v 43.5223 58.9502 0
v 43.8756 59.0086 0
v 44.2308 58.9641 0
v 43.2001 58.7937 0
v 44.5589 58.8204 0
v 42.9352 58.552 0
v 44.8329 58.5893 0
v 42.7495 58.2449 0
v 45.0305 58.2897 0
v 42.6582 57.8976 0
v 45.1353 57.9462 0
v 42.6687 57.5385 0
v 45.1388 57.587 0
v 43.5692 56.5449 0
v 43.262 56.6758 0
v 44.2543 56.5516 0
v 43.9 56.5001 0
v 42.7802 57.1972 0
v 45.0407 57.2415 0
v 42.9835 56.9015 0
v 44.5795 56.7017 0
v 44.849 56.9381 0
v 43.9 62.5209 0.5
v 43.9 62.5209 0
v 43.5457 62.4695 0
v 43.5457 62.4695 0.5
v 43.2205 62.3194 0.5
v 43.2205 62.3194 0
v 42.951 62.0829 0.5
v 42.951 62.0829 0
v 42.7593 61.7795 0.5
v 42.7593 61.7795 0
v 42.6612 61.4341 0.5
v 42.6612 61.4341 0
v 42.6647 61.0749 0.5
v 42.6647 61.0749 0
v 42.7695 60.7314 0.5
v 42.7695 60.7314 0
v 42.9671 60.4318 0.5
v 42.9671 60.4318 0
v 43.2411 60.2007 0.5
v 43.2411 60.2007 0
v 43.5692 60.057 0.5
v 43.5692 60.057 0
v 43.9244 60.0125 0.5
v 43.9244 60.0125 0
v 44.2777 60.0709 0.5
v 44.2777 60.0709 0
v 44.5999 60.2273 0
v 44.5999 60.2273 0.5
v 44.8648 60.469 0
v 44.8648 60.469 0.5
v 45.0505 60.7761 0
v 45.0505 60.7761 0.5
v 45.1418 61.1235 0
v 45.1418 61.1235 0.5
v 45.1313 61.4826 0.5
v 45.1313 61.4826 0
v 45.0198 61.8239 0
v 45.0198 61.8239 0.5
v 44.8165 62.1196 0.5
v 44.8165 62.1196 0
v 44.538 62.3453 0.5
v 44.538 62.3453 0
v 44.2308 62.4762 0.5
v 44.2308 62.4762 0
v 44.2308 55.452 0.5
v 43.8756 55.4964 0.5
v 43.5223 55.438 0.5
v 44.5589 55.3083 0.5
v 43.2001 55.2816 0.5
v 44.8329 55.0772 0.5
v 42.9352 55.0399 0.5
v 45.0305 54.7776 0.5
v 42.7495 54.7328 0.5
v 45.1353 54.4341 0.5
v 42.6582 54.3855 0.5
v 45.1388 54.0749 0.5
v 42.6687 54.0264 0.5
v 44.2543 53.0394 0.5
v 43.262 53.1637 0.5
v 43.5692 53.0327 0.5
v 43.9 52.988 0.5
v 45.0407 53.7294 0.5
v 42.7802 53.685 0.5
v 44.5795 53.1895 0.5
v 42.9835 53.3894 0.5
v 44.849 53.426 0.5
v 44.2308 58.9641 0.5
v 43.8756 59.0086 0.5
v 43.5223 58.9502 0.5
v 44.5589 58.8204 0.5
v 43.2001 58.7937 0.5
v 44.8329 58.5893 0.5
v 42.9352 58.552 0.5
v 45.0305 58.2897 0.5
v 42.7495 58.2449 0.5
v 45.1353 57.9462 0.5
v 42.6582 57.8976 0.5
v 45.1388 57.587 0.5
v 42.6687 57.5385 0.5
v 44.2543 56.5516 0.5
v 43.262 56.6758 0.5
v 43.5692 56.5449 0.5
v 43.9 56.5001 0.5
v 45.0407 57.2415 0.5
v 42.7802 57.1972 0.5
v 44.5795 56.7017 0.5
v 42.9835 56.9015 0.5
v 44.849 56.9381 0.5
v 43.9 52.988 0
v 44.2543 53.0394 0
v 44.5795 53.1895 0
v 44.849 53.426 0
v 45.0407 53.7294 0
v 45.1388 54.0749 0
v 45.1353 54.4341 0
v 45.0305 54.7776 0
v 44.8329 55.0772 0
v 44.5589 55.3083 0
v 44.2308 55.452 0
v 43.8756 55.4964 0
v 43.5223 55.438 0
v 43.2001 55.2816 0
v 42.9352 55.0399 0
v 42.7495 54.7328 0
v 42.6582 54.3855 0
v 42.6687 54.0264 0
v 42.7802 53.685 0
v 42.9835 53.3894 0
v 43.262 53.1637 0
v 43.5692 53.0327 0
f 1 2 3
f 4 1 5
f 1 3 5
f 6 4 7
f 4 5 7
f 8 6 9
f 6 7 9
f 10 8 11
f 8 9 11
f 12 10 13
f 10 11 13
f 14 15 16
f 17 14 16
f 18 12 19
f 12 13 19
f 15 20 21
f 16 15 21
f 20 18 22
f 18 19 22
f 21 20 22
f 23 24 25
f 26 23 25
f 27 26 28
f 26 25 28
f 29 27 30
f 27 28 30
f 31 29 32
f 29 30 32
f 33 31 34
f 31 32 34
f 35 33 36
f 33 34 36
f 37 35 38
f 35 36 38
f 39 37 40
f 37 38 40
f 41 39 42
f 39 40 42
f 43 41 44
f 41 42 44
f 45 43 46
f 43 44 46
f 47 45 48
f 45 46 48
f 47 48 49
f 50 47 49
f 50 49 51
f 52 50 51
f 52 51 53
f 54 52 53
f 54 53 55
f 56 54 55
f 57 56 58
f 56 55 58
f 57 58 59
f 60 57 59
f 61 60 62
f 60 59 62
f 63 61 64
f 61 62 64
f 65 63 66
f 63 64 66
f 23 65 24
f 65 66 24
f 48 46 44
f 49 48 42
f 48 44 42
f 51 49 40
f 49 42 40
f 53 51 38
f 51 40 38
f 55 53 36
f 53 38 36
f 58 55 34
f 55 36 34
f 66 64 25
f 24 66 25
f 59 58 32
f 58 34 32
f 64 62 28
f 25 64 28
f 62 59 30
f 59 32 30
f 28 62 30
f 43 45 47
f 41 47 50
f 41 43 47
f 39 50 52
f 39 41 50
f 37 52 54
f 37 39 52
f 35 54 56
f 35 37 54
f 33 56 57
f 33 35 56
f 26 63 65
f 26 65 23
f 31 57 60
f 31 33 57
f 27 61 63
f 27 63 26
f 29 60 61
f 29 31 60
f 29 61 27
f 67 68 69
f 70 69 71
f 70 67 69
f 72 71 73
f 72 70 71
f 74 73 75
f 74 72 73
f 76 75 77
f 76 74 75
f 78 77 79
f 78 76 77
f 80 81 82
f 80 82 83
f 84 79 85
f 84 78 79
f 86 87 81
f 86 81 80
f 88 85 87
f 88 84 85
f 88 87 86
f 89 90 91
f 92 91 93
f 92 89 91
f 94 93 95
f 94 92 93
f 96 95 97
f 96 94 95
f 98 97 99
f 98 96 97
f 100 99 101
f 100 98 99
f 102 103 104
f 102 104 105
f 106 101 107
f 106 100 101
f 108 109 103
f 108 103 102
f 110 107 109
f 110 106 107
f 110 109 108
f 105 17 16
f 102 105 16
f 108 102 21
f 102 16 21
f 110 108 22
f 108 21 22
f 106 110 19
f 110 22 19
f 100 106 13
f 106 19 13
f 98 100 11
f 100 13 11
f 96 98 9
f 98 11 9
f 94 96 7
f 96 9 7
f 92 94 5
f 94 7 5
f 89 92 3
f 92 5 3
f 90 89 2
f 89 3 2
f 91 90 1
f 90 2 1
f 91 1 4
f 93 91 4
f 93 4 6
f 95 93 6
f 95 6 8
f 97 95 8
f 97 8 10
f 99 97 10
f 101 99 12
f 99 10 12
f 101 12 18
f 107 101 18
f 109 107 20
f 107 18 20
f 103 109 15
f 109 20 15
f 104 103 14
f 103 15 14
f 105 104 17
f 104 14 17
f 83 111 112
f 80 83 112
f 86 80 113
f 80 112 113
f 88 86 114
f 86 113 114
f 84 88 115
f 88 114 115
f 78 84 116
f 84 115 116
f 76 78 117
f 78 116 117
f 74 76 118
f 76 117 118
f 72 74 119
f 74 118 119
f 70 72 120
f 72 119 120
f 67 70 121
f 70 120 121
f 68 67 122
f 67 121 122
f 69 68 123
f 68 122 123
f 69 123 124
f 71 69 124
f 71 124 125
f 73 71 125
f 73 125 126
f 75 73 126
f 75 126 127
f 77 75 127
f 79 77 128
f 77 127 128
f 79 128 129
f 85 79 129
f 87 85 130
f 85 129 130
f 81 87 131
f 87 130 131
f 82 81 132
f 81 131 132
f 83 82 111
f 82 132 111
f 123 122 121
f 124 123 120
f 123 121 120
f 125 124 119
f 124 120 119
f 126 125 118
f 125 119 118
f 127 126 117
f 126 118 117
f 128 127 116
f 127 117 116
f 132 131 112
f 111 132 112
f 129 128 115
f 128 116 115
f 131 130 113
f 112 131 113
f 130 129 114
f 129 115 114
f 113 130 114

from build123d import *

# Parameters (mm, degrees)
ESQUISSE1_RX         = 1.254332769
ESQUISSE1_RY         = 1.25
BOSS_EXTRU_1_DEPTH   = 0.5
BOSS_EXTRU_1_2_DEPTH = 0.5
BOSS_EXTRU_1_3_DEPTH = 0.5


with BuildPart() as part:
    # Esquisse1 → Boss.-Extru.1 (new body)
    with BuildSketch(Plane.XY):
        with Locations(Location((43.9, 54.242337162), (0, 0, -90))):
            Ellipse(ESQUISSE1_RX, ESQUISSE1_RY)
    extrude(amount=BOSS_EXTRU_1_DEPTH)


with BuildPart() as body_2:
    # Esquisse1 → Boss.-Extru.1 2 (new body)
    with BuildSketch(Plane.XY):
        with Locations(Location((43.9, 57.754468914), (0, 0, -90))):
            Ellipse(ESQUISSE1_RX, ESQUISSE1_RY)
    extrude(amount=BOSS_EXTRU_1_2_DEPTH)


with BuildPart() as body_3:
    # Esquisse1 → Boss.-Extru.1 3 (new body)
    with BuildSketch(Plane.XY):
        with Locations(Location((43.9, 61.266600666), (0, 0, 90))):
            Ellipse(ESQUISSE1_RX, ESQUISSE1_RY)
    extrude(amount=BOSS_EXTRU_1_3_DEPTH)


solid = Compound([part.part, body_2.part, body_3.part])
